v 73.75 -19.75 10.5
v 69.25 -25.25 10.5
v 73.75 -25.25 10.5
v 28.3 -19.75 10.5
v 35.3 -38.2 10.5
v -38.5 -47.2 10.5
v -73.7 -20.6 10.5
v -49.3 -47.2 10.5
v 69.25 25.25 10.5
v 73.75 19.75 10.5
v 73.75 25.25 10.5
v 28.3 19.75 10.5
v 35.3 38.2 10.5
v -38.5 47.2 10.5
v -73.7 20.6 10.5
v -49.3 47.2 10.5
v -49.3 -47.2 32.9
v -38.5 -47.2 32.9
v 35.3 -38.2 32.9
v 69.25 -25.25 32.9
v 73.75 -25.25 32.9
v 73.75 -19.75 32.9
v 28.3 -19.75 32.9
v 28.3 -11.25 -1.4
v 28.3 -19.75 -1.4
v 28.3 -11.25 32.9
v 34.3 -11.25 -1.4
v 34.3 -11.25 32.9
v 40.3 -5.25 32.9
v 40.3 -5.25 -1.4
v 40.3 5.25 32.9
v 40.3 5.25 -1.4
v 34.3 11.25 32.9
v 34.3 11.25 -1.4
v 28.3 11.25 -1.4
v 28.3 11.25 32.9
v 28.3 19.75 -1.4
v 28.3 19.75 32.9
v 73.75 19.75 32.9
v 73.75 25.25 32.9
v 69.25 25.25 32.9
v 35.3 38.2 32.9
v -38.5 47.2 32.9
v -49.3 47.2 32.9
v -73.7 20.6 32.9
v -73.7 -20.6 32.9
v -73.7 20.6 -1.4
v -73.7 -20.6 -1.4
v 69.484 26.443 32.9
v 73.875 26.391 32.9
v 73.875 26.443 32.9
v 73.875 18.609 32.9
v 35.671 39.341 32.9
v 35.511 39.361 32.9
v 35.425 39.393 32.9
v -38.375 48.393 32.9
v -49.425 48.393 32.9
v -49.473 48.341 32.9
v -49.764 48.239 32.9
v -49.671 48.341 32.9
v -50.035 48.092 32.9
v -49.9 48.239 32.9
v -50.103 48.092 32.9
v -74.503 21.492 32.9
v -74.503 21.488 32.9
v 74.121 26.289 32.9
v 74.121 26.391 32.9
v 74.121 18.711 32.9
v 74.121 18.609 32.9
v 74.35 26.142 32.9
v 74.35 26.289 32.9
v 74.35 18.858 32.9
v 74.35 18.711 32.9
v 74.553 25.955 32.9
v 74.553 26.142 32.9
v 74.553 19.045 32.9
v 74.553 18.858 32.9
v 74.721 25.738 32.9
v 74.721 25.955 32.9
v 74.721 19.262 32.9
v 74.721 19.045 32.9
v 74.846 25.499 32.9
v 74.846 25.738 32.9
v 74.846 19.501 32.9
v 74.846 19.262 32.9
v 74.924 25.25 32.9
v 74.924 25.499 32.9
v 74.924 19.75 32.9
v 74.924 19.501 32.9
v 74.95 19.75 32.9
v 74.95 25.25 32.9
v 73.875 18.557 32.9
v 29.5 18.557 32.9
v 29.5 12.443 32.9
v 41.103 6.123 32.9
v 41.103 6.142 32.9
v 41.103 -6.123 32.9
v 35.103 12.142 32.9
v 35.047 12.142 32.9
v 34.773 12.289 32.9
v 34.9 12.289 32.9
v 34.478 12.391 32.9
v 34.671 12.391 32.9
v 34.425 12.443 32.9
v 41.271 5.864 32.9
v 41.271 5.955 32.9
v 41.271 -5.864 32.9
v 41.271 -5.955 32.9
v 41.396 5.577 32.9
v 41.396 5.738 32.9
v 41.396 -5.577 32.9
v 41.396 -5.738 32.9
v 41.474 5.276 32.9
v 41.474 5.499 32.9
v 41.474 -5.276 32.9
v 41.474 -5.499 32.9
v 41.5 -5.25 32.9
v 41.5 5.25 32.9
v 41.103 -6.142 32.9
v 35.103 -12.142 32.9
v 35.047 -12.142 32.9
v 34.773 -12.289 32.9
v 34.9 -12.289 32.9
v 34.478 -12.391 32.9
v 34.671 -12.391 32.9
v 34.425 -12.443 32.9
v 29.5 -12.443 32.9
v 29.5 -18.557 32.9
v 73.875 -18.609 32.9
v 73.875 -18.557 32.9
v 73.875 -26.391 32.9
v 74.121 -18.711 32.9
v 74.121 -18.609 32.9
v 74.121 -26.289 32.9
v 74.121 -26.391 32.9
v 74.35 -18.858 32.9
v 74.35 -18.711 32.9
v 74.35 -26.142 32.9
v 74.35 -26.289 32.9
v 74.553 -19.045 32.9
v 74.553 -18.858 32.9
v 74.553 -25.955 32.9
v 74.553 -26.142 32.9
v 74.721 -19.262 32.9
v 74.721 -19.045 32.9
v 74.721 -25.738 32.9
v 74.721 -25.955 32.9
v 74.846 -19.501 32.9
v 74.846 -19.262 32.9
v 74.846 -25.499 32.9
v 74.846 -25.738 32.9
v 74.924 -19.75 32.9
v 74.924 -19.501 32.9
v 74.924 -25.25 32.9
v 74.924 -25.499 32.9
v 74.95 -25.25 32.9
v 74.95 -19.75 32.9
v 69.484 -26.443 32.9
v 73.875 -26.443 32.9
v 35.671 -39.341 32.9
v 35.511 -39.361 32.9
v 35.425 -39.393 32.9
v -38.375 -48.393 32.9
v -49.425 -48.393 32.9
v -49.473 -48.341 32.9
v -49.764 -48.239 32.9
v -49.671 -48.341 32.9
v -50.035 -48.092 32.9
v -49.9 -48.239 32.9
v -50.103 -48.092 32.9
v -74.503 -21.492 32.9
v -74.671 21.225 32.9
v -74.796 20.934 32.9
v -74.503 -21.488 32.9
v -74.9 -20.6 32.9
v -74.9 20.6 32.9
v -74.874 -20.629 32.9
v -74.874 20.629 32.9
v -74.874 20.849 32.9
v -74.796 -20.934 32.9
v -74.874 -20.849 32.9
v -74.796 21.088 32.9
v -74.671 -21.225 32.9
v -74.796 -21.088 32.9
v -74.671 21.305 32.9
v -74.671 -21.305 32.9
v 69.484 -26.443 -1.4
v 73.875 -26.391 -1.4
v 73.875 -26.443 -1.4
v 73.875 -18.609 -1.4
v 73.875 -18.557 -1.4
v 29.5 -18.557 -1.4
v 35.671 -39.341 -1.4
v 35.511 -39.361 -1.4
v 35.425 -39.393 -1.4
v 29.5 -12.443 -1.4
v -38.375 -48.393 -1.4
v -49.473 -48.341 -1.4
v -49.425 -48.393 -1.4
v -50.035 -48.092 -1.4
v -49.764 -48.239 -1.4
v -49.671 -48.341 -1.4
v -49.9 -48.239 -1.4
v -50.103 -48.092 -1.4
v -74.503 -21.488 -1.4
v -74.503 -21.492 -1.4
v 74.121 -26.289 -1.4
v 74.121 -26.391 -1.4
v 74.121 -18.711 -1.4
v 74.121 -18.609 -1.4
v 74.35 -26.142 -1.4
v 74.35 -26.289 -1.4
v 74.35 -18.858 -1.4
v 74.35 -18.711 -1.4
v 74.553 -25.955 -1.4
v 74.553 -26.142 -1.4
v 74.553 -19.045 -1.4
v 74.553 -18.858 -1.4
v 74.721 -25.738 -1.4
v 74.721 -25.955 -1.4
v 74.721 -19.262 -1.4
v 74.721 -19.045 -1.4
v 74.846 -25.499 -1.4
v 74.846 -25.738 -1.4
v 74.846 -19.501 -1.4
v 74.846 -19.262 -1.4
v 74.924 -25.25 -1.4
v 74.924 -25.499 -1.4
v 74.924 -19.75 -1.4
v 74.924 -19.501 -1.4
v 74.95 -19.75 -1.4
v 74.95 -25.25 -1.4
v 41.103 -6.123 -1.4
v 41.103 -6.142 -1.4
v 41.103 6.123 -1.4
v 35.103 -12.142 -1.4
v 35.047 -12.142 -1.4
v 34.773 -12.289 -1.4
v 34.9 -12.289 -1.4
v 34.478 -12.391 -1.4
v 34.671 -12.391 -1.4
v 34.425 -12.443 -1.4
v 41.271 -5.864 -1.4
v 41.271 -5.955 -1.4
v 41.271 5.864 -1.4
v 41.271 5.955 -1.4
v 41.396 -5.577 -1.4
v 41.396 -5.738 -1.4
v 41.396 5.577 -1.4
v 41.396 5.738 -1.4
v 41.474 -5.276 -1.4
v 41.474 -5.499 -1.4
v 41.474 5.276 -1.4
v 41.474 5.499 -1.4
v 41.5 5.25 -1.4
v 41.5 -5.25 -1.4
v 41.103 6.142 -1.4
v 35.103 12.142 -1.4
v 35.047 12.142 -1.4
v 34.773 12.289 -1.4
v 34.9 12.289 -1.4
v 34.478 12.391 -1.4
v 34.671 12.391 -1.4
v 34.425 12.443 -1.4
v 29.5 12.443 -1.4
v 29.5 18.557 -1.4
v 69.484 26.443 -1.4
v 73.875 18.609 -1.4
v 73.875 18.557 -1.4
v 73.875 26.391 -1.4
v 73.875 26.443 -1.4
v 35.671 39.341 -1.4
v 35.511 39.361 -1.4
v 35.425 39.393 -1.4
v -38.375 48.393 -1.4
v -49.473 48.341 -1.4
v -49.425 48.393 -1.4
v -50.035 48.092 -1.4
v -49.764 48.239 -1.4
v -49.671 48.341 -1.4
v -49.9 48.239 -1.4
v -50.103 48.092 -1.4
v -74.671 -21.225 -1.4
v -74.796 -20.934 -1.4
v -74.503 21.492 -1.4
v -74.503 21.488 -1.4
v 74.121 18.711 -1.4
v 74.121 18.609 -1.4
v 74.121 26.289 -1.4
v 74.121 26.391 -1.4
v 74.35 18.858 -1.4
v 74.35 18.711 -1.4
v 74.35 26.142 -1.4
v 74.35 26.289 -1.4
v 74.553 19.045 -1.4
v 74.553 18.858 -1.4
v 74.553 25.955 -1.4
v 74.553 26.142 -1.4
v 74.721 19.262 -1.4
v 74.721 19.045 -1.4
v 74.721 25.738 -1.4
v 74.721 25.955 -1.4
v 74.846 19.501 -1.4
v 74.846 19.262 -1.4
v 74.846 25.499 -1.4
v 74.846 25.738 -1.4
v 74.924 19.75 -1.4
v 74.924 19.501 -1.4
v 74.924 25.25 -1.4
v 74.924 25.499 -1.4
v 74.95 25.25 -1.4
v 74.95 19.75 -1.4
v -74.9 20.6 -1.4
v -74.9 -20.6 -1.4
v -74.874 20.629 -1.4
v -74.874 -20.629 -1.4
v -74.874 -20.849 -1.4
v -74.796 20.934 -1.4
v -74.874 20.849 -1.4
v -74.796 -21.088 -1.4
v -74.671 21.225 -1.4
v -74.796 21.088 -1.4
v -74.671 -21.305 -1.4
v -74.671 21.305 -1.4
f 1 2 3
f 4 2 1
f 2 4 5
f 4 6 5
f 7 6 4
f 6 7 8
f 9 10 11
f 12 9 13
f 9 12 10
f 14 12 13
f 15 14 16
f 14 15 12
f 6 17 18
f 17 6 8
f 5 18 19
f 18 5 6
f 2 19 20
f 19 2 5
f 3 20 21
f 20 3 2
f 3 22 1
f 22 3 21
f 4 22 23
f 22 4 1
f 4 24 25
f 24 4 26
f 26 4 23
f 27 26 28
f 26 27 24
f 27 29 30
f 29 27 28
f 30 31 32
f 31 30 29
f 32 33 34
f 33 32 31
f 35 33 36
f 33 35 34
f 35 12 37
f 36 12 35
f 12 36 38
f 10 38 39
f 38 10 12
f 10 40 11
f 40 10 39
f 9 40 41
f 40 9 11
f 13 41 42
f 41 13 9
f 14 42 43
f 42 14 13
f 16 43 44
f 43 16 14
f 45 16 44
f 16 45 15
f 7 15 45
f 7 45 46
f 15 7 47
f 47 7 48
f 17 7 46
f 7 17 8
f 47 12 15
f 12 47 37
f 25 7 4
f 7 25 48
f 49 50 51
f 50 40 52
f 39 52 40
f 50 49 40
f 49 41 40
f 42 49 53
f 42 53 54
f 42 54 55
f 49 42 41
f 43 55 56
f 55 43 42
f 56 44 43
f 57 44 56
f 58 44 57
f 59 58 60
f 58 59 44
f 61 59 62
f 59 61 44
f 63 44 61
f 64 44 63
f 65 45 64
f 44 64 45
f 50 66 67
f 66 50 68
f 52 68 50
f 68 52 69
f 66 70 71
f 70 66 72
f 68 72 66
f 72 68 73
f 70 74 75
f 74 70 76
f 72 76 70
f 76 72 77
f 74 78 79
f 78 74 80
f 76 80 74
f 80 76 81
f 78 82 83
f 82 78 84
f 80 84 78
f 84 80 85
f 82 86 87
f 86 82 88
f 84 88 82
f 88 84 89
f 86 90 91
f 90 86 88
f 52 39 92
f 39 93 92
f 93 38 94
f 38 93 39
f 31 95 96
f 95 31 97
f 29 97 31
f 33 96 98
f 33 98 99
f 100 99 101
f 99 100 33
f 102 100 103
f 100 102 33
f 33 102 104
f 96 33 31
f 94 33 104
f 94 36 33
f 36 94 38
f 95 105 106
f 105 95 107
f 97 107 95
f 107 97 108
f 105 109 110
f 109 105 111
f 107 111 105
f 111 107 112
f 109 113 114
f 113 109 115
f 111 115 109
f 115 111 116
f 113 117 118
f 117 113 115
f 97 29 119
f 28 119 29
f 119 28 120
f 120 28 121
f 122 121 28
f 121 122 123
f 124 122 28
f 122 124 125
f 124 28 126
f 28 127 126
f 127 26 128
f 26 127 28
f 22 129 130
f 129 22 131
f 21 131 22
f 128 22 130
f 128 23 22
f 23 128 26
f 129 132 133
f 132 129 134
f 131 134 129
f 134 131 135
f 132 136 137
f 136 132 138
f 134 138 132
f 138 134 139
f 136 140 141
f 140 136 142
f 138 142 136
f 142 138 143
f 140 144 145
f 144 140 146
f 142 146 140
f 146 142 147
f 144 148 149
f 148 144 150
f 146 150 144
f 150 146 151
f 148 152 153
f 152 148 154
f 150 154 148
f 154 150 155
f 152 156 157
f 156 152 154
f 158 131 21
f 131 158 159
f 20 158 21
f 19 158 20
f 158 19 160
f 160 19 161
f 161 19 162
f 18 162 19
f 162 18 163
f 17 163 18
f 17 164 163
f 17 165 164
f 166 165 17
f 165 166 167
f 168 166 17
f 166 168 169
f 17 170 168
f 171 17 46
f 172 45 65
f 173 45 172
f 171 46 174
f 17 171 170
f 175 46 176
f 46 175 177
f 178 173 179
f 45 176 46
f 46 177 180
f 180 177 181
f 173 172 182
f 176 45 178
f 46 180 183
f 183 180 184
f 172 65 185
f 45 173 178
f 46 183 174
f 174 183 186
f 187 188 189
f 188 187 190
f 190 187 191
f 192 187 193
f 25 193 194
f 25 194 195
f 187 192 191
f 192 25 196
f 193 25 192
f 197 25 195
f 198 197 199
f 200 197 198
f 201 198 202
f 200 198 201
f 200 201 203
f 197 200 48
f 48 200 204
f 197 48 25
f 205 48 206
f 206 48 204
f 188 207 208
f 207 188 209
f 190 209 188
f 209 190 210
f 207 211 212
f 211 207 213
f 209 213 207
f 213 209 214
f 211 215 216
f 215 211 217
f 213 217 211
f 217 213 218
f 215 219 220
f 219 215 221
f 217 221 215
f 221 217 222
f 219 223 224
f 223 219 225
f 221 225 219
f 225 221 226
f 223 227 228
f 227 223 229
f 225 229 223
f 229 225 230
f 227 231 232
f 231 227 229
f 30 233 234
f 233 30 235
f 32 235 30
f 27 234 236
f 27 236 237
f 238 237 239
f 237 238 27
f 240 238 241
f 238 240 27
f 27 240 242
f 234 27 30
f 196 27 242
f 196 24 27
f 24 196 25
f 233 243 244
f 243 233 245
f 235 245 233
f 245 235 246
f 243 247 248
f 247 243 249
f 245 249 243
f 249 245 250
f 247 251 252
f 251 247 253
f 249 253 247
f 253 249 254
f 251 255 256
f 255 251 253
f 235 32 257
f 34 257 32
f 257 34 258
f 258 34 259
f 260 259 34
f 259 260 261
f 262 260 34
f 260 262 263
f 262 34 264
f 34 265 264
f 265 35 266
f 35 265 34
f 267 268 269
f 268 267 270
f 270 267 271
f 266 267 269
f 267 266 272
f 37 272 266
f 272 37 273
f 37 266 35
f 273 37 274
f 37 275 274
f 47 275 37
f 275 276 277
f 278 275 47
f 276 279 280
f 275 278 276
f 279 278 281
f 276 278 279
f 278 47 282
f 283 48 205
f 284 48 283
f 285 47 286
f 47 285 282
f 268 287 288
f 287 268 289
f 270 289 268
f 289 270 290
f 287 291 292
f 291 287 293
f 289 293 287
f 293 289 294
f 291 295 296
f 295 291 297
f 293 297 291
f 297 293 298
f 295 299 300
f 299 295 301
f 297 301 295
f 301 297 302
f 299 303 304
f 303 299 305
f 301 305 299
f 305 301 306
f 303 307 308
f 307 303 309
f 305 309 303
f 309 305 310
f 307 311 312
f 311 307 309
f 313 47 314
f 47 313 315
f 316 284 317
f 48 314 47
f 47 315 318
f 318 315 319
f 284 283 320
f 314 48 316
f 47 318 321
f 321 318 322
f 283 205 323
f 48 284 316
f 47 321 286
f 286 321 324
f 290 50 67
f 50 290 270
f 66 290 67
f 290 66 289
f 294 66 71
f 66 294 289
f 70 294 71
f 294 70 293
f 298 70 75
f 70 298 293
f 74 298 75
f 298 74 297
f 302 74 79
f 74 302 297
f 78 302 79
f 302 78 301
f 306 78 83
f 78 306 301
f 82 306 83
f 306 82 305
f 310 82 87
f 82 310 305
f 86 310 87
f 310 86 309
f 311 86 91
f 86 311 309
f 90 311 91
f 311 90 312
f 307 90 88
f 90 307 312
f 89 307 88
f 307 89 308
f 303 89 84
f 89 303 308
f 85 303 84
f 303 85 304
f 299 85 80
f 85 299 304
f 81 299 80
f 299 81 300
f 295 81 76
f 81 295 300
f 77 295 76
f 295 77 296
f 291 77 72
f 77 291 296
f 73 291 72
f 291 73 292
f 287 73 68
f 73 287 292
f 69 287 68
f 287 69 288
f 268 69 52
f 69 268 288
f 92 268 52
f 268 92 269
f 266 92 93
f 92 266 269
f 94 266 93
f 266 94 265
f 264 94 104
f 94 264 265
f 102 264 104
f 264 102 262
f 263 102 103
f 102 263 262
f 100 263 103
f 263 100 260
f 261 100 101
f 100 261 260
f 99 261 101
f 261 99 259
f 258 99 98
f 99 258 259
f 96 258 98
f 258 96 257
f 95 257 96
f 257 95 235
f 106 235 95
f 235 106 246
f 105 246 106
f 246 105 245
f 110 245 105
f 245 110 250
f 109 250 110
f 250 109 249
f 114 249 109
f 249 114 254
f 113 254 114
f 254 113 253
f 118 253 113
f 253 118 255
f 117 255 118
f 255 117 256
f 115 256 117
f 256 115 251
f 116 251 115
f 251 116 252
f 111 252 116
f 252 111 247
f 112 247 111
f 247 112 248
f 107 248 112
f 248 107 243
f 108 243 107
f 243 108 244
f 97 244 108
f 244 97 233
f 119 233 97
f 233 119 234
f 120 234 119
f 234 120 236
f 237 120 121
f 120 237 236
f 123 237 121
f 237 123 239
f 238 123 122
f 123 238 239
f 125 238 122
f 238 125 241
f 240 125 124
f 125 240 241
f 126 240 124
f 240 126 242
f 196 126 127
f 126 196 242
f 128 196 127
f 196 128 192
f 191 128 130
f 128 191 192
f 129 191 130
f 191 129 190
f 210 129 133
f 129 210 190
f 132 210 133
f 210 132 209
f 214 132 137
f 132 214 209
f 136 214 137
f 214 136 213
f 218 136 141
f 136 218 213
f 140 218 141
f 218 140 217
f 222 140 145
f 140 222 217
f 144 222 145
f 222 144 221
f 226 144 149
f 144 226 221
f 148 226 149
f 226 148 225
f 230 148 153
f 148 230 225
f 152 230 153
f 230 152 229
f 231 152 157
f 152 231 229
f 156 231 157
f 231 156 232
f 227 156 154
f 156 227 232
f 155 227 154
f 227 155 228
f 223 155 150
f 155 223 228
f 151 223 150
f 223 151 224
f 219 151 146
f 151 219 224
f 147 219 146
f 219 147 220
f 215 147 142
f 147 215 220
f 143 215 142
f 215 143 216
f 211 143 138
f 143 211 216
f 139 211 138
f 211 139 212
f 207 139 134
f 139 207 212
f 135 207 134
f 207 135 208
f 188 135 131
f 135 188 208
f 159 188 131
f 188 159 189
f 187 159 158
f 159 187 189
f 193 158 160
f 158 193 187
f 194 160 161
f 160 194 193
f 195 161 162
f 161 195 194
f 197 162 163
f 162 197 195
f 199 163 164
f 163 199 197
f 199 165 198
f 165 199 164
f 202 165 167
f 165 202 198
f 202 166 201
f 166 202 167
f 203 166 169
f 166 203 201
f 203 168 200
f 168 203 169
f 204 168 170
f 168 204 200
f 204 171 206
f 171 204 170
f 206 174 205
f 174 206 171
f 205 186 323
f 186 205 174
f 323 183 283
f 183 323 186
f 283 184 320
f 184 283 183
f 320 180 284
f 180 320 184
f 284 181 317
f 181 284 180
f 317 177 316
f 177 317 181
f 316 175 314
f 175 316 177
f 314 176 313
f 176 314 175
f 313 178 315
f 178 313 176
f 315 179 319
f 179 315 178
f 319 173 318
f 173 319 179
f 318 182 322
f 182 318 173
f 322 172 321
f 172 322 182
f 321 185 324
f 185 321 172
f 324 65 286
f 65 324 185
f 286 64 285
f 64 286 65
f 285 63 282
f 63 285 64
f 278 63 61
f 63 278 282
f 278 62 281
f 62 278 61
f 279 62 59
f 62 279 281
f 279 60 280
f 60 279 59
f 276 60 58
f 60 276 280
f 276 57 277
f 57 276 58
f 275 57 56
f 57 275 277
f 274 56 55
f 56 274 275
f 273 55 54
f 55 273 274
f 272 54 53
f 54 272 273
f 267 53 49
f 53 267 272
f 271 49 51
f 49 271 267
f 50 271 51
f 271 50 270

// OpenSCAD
/* yt-2400-bin.scad
 *
 * Copyright (C) Robert B. Ross, 2016
 *
 * This software is released under the Creative Commons Attribution
 * Non-Commercial License. It is derived from the model by Slannesh
 * as downloaded on 3/5/2016 from the following URL:
 *   http://www.thingiverse.com/thing:1250010
 *
 * Specifically, the outline of the Decimator was extracted from 
 * Slannesh's model.
 */


include <./bintools.scad>

$fn=160;
binHeight   = 46.5;

/* locations is a pair of triples, translate : rotate pairs
 */
locations = [[[0,0,0], [0,0,0]]];

// harborFreightHugeFullHt(locations,inset=1) decimatorBlank();

// decimatorBlank();
decimatorOutline();

/*
difference() {
   decimatorOutline();
   translate([2.5,-30,0]) cube([40,60,50]);
}
*/

/* decimatorOutline() -- test piece for outline
 */
module decimatorOutline() {
   translate([0,0,33]) rotate([180,0,0]) {
      blankCutout(height=34.5 - 0.1, outlineScale=1.2) decimatorBlank();
   }
}

module decimatorBlank() {
   blankHeight = 24; 
   
   rotate([180,0,0]) translate([0,0,-binHeight]) union() {
      translate([0,0,blankHeight]) linear_extrude(height=blankHeight) decimatorShell();
      linear_extrude(height=binHeight) decimatorBottom();
   } /* rotate, translate, union */
}

module decimatorBottom() {
   for (i=[0:1]) mirror([0,i,0]) 
      polygon(points=[[-73.7,0],[-73.7,20.6],
                      [28.3,19.75],[28.3,11.25],[34.3,11.25],[40.3,5.25],
                      [40.3,0]]);
}
module decimatorShell() {
   for (i=[0:1]) mirror([0,i,0]) 
      polygon(points=[[-73.7,0],[-73.7,20.6],[-49.3,47.2],[-38.5,47.2],
                      [35.3,38.2],[69.25,25.25],[73.75,25.25],[73.75,19.75],
                      [28.3,19.75],[28.3,11.25],[34.3,11.25],[40.3,5.25],
                      [40.3,0]]);
}

/*
 * Local variables:
 *  mode: C
 *  c-indent-level: 3
 *  c-basic-offset: 3
 * End:
 *
 * vim: ts=8 sts=3 sw=3 expandtab
 */
